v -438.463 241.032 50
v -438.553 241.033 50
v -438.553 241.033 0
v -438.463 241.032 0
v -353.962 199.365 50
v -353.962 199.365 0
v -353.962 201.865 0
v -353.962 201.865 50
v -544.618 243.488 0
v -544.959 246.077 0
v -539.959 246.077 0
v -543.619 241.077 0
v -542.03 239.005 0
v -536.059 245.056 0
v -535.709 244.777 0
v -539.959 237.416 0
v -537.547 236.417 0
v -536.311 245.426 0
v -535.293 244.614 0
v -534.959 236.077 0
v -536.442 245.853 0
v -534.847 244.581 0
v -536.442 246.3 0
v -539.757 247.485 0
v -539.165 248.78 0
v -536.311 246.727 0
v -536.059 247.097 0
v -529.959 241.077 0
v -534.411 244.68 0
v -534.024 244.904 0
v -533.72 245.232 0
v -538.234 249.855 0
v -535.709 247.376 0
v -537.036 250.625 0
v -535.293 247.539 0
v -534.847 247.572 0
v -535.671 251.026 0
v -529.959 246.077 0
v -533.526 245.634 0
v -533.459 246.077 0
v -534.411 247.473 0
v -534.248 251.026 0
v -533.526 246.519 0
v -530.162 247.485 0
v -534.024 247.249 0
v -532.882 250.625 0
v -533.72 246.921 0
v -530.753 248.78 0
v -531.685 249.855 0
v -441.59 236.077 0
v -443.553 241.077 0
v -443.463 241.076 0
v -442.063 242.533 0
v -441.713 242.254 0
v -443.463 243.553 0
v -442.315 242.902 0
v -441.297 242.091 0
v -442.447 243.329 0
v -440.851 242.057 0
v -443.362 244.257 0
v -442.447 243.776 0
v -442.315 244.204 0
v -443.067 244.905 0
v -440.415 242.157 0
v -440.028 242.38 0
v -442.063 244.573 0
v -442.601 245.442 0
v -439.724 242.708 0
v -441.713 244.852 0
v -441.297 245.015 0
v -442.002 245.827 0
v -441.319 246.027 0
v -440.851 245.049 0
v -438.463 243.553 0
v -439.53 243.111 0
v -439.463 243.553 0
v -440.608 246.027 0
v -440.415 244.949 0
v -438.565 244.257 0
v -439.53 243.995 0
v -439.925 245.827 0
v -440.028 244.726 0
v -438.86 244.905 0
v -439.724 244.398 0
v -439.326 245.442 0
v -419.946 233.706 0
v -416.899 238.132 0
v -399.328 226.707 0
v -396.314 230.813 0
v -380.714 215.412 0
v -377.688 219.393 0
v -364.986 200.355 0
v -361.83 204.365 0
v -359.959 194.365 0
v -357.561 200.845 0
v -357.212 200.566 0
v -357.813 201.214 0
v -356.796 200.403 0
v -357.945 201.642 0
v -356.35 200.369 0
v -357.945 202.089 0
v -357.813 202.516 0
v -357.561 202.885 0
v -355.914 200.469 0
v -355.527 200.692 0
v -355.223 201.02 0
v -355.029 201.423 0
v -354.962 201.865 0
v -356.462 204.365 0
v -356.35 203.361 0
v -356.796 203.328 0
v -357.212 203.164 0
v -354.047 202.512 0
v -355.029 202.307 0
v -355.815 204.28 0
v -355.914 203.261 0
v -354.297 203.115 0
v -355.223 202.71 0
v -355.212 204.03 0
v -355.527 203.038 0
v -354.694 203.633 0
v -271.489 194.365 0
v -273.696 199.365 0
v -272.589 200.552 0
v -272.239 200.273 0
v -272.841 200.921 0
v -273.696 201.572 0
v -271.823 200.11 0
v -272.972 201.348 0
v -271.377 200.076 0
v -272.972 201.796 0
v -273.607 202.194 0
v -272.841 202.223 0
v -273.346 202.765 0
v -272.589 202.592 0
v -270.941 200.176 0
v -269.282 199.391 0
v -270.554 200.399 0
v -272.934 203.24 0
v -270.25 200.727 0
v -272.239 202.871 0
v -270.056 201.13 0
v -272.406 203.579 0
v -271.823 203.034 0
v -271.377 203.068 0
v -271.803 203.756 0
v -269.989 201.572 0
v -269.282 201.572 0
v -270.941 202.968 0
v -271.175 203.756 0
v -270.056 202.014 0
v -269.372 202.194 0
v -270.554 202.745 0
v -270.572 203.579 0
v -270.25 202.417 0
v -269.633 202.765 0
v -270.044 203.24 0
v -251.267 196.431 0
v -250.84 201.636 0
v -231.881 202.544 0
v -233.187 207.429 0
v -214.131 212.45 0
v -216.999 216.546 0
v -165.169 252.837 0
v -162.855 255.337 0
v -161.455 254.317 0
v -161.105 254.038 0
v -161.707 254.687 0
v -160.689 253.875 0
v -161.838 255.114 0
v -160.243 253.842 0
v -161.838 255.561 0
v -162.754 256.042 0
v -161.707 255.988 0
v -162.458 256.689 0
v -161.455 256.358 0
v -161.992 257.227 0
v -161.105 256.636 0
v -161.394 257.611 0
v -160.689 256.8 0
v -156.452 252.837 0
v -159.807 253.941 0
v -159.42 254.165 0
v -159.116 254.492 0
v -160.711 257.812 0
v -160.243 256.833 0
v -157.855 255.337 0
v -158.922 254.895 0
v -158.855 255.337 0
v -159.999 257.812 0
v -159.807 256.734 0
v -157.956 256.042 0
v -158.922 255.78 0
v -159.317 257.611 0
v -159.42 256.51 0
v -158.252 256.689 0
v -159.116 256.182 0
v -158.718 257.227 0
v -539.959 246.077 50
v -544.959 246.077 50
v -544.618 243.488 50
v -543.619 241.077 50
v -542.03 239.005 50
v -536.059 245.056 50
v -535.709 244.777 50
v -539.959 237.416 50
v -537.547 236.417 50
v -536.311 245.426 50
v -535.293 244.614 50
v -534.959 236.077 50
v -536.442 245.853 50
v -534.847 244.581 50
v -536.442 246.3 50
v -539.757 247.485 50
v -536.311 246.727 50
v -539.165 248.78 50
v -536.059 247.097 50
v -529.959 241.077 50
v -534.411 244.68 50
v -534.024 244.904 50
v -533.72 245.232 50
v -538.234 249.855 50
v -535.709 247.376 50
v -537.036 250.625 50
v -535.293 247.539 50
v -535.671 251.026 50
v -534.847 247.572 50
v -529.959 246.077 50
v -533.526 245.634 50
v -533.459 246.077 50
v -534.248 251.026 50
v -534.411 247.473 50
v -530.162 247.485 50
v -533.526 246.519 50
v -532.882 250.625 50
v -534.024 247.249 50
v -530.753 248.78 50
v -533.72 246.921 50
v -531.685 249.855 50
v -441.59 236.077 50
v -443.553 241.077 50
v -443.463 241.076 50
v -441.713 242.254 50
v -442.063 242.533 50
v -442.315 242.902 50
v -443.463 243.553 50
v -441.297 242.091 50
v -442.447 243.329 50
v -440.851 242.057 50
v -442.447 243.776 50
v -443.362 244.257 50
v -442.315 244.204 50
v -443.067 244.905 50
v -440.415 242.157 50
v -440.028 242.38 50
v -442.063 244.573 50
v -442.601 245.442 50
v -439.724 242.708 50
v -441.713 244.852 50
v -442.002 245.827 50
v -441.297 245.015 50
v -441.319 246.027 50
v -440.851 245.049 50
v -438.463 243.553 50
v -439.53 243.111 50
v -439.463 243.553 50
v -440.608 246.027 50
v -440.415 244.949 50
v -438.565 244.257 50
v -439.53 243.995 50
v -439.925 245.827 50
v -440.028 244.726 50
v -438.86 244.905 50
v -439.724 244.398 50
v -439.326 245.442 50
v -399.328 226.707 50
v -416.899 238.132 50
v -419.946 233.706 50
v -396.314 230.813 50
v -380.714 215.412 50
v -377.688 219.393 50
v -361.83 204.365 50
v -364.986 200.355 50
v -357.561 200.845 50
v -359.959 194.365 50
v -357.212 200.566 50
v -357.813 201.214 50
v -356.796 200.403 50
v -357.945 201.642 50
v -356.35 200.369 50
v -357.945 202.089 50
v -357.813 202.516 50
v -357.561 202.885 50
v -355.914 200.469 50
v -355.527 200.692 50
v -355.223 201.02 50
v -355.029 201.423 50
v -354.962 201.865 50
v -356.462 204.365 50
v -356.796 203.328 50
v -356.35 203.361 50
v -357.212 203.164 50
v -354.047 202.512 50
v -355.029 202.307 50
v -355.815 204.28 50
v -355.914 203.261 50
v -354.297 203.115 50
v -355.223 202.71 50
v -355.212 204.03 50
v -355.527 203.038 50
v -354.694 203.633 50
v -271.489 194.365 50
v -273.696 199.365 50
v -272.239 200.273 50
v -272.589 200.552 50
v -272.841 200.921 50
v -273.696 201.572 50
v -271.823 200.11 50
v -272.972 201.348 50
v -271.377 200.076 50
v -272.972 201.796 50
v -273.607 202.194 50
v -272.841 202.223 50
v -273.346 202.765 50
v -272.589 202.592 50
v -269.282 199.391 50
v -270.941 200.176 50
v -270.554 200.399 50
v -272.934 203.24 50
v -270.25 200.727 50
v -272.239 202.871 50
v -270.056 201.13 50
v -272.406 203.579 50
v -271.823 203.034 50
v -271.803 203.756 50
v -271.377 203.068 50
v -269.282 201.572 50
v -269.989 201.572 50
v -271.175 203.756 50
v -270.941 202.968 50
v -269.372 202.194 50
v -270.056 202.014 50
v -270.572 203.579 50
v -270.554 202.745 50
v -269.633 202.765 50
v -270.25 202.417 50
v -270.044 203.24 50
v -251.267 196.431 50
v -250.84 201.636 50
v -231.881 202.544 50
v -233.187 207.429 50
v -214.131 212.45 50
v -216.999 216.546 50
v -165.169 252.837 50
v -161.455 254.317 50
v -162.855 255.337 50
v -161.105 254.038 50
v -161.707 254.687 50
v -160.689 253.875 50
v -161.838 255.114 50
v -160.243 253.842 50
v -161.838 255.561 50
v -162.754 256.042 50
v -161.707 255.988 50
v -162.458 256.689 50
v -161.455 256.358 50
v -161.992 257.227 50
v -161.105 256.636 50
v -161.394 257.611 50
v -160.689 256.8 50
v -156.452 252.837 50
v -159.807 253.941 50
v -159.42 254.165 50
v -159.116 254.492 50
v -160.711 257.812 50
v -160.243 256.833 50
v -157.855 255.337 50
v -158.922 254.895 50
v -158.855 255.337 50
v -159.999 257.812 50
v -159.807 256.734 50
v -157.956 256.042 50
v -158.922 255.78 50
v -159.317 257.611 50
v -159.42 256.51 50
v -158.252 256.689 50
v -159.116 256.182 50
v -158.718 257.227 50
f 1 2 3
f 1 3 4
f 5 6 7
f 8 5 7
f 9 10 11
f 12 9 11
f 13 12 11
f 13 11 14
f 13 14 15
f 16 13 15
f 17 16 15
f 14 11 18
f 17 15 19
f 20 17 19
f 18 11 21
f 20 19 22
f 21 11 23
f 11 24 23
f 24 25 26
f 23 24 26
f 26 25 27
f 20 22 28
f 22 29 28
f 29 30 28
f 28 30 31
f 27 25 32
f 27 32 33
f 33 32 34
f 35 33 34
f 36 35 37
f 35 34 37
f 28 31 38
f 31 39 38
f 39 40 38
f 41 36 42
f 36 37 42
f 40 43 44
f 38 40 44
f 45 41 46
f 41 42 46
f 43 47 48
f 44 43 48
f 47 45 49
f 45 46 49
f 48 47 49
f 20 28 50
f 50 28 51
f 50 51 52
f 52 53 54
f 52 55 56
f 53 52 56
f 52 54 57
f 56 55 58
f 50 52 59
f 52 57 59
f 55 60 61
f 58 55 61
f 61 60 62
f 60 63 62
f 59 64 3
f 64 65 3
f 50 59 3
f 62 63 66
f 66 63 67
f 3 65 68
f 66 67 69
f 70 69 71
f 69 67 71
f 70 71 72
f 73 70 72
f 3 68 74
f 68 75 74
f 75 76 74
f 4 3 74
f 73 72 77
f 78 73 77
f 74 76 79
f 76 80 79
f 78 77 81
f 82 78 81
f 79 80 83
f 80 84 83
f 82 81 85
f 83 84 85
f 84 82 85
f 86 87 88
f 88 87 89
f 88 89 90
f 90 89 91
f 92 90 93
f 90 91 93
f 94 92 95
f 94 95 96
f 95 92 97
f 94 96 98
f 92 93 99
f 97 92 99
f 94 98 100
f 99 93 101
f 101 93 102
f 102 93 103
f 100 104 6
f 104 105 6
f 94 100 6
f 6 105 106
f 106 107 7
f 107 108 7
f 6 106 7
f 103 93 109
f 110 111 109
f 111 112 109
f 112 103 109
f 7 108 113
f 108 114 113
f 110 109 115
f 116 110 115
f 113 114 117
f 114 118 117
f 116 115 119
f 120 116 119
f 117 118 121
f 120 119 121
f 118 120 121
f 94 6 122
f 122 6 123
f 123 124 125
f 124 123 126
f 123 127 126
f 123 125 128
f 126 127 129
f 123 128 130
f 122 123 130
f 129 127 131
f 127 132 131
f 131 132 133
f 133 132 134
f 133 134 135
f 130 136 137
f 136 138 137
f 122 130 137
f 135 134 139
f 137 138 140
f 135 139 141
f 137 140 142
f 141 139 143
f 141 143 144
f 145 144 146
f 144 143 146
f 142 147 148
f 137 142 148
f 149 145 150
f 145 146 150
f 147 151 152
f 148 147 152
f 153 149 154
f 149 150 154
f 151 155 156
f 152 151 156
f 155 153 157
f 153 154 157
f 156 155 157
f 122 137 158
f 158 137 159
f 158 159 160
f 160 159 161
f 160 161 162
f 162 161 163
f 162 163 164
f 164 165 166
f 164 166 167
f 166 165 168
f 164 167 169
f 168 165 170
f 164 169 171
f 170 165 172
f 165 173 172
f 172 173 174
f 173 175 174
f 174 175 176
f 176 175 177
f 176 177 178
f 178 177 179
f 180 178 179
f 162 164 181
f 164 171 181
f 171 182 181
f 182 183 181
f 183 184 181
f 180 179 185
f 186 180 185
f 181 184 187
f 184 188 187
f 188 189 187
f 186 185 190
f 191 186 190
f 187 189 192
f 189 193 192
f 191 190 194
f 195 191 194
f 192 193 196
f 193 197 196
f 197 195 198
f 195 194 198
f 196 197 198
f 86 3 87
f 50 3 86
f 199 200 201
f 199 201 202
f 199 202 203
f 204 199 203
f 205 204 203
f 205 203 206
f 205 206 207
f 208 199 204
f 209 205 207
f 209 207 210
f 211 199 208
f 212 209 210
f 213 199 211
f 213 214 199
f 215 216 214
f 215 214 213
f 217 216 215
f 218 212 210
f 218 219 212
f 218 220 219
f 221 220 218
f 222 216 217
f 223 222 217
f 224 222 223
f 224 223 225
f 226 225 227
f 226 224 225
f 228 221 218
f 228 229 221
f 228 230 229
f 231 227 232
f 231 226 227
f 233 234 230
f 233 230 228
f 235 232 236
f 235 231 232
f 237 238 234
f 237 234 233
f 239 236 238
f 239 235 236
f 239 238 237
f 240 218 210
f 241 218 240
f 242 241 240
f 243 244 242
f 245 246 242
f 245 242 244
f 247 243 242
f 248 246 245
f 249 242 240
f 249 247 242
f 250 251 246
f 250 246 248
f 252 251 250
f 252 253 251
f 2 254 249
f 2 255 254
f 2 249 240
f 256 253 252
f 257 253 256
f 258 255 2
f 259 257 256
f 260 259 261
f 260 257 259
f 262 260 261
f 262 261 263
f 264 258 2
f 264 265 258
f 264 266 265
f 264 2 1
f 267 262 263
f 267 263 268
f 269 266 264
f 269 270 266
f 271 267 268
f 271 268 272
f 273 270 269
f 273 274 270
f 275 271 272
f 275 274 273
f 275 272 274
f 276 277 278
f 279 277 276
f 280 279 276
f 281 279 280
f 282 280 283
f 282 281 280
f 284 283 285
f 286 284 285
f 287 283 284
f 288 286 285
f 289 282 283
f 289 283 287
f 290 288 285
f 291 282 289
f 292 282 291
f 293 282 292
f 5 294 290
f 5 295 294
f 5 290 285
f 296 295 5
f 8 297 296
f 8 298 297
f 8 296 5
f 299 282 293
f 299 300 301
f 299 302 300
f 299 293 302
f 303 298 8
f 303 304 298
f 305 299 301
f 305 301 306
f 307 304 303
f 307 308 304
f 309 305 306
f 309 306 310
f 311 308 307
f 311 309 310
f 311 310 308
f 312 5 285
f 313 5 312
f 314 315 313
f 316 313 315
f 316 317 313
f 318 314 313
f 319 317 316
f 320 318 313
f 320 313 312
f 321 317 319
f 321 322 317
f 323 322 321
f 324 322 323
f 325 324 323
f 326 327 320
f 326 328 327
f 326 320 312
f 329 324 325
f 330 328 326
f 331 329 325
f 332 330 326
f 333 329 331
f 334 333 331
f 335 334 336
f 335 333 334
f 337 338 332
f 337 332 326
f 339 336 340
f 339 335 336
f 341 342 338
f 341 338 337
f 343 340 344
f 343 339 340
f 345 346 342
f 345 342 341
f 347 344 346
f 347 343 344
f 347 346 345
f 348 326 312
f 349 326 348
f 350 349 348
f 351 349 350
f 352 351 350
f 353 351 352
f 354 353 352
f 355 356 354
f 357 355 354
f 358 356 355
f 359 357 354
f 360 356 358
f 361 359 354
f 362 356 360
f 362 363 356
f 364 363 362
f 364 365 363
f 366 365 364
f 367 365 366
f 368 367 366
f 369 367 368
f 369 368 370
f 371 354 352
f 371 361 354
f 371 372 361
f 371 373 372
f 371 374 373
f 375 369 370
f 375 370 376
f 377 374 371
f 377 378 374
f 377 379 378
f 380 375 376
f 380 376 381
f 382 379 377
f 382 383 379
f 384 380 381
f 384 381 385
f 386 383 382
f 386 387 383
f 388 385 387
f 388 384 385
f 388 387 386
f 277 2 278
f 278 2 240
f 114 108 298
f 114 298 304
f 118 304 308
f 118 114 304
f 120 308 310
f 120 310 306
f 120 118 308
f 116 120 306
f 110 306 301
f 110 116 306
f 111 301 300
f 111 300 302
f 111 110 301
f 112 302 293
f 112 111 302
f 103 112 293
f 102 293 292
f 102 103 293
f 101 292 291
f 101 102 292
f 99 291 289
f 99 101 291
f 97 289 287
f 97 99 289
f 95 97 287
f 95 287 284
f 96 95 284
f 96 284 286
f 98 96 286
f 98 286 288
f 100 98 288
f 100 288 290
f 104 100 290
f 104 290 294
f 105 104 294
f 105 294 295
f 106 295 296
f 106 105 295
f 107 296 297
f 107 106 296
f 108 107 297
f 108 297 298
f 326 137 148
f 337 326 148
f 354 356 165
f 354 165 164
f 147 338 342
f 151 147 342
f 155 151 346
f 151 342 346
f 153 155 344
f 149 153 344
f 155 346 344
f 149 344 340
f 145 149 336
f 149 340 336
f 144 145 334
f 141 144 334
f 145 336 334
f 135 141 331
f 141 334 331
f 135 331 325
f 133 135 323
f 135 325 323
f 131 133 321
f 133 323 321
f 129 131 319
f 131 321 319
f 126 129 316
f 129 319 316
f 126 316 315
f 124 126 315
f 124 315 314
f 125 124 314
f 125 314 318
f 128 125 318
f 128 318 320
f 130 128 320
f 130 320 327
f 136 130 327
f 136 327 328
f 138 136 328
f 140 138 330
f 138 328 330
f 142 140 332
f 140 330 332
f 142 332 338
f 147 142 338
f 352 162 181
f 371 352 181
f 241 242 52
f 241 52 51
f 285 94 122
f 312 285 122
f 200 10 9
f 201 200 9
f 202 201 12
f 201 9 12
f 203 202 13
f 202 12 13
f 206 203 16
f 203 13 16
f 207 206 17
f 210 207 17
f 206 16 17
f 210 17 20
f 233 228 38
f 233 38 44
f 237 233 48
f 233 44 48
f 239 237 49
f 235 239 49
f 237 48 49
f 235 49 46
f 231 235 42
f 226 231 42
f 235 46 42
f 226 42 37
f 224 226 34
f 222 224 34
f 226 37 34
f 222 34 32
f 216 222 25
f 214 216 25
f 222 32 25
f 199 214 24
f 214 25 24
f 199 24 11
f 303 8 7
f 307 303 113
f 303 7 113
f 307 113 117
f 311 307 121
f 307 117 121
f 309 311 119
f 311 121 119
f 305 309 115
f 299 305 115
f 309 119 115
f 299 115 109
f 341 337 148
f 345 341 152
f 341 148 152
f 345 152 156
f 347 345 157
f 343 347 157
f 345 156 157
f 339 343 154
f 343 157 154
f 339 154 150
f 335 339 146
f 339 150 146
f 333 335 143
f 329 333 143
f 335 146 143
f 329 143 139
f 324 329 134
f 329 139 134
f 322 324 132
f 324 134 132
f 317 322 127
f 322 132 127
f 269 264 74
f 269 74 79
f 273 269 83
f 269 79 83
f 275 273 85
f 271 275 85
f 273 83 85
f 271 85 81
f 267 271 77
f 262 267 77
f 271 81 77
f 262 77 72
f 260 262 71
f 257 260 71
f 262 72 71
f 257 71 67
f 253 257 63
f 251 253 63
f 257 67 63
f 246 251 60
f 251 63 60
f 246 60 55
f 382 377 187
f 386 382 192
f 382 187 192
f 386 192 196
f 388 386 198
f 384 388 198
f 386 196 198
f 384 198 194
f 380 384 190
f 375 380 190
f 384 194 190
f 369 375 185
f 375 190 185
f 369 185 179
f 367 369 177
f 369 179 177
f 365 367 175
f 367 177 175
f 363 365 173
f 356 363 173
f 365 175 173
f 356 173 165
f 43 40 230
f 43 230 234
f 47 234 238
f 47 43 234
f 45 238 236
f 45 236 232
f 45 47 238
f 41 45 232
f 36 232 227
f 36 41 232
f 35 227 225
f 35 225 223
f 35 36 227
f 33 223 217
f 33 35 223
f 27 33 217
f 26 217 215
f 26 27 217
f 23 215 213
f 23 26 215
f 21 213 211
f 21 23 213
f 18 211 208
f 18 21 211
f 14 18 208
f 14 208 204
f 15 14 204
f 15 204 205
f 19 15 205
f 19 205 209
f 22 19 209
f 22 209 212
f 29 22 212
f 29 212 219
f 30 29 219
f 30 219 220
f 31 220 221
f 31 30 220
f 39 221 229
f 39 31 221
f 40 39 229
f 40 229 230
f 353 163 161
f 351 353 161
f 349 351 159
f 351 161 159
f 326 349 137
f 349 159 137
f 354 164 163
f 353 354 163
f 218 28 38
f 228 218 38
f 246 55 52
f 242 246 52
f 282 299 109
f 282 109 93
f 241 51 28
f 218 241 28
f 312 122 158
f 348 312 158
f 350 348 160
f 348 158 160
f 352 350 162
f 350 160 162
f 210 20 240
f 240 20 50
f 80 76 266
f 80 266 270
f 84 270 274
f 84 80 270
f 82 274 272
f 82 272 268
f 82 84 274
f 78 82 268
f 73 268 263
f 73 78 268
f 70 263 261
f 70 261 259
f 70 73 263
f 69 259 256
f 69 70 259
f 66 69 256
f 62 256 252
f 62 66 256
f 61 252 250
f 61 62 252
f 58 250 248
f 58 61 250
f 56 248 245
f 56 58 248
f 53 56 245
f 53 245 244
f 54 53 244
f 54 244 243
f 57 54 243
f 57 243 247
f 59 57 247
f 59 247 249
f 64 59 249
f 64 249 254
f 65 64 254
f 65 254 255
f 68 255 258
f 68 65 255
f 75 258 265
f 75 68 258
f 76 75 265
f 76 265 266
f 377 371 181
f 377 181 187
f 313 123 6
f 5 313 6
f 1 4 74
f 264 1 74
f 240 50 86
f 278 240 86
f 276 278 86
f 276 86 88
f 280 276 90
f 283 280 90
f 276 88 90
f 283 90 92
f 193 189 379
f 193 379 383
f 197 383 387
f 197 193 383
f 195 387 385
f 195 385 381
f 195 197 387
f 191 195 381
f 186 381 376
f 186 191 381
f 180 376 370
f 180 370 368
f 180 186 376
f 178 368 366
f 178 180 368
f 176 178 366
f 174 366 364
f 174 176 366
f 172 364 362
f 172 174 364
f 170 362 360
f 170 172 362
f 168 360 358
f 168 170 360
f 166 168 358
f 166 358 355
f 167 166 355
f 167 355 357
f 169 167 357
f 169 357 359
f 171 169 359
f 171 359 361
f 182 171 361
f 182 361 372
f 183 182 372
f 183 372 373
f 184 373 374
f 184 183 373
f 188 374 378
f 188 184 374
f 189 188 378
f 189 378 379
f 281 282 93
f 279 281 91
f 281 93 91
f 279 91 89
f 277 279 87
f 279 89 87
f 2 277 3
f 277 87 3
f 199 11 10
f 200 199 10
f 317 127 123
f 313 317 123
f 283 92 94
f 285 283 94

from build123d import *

# Parameters (mm, degrees)
SKETCH1_R           = 1.5
BOSS_EXTRUDE1_DEPTH = 50
SKETCH3_R           = 1.5
CUT_EXTRUDE1_DEPTH  = 50


with BuildPart() as part:
    # Sketch1 → Boss-Extrude1 (new body)
    with BuildSketch(Plane.XY):
        with BuildLine():
            ThreePointArc((-438.463421682, 243.552927072), (-440.963421682, 246.052927072), (-443.463421682, 243.552927072))
            Line((-443.463421682, 243.552927072), (-443.463421682, 241.075715503))
            Line((-443.463421682, 241.075715503), (-443.553411549, 241.076505927))
            Line((-443.553411549, 241.076505927), (-529.959210098, 241.076505927))
            Line((-529.959210098, 241.076505927), (-529.959210098, 246.076505927))
            ThreePointArc((-529.959210098, 246.076505927), (-534.959210098, 251.076505927), (-539.959210098, 246.076505927))
            Line((-539.959210098, 246.076505927), (-544.959210098, 246.076505927))
            ThreePointArc((-544.959210098, 246.076505927), (-542.030277909, 239.005438115), (-534.959210098, 236.076505927))
            Line((-534.959210098, 236.076505927), (-441.589975913, 236.076505927))
            ThreePointArc((-441.589975913, 236.076505927), (-399.328149739, 226.70728463), (-364.985531601, 200.355266895))
            Line((-364.985531601, 200.355266895), (-359.959210098, 194.365130186))
            Line((-359.959210098, 194.365130186), (-271.489088985, 194.365130186))
            ThreePointArc((-271.489088985, 194.365130186), (-241.418509035, 198.993435111), (-214.13144535, 212.449925757))
            Line((-214.13144535, 212.449925757), (-156.452183895, 252.837379426))
            Line((-156.452183895, 252.837379426), (-157.855222331, 255.337379426))
            ThreePointArc((-157.855222331, 255.337379426), (-160.355222331, 257.837379426), (-162.855222331, 255.337379426))
            Line((-162.855222331, 255.337379426), (-165.169417873, 252.837379426))
            Line((-165.169417873, 252.837379426), (-216.999327532, 216.545685979))
            ThreePointArc((-216.999327532, 216.545685979), (-241.871536557, 204.099961997), (-269.282233437, 199.390766337))
            Line((-269.282233437, 199.390766337), (-269.282233437, 201.571985734))
            ThreePointArc((-269.282233437, 201.571985734), (-271.489088985, 203.778841282), (-273.695944534, 201.571985734))
            Line((-273.695944534, 201.571985734), (-273.695944534, 199.365130186))
            Line((-273.695944534, 199.365130186), (-353.961902661, 199.365130186))
            Line((-353.961902661, 199.365130186), (-353.961902661, 201.865130186))
            ThreePointArc((-353.961902661, 201.865130186), (-354.694135708, 203.632897139), (-356.461902661, 204.365130186))
            Line((-356.461902661, 204.365130186), (-361.829937067, 204.365130186))
            ThreePointArc((-361.829937067, 204.365130186), (-396.313657586, 230.813272806), (-438.553411549, 241.032588537))
            Line((-438.553411549, 241.032588537), (-438.463421682, 241.031798113))
            Line((-438.463421682, 241.031798113), (-438.463421682, 243.552927072))
        make_face()
        with Locations((-440.963421682, 243.552927072)):
            Circle(SKETCH1_R, mode=Mode.SUBTRACT)
        with Locations((-534.959210098, 246.076505927)):
            Circle(SKETCH1_R, mode=Mode.SUBTRACT)
        with Locations((-160.355222331, 255.337379426)):
            Circle(SKETCH1_R, mode=Mode.SUBTRACT)
        with Locations((-356.461902661, 201.865130186)):
            Circle(SKETCH1_R, mode=Mode.SUBTRACT)
    extrude(amount=BOSS_EXTRUDE1_DEPTH)

    # Sketch3 → Cut-Extrude1 (cut)
    with BuildSketch(Plane.XY.offset(50)):
        with Locations((-271.489088985, 201.571985734)):
            Circle(SKETCH3_R)
    extrude(amount=-CUT_EXTRUDE1_DEPTH, mode=Mode.SUBTRACT)


solid = part.part
